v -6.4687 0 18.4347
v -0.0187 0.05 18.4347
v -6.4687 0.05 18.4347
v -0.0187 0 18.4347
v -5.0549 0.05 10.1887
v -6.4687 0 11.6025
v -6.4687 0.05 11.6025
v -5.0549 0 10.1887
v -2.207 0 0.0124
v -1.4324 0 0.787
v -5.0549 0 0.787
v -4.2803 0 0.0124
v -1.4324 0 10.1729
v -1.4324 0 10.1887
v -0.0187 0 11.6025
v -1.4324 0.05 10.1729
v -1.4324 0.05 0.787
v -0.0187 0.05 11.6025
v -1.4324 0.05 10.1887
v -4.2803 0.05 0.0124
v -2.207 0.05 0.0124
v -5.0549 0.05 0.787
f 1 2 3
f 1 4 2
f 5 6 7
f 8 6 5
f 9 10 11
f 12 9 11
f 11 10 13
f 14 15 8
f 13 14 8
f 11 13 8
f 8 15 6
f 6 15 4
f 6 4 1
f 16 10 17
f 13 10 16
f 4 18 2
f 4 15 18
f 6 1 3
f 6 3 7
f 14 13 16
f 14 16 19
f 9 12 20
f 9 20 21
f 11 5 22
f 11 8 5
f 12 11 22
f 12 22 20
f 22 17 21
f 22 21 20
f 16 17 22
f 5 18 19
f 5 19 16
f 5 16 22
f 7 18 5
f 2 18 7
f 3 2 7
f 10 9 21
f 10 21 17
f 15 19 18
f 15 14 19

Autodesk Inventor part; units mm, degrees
ref_plane "YZ Plane" through (0, 0, 0) normal (1, 0, 0) x (0, 1, 0)
ref_plane "XZ Plane" through (0, 0, 0) normal (0, 1, 0) x (-1, 0, 0)
ref_plane "XY Plane" through (0, 0, 0) normal (0, 0, 1) x (1, 0, 0)
sketch "Sketch1" plane through (0, 0, 0) normal (0, 1, 0) x (-1, 0, 0)
  line L0 (6.4687, 18.4347) -> (6.4687, 11.6025)
  line L1 (6.4687, 11.6025) -> (5.0549, 10.1887)
  line L2 (5.0549, 10.1887) -> (5.0549, 0.787)
  line L3 (5.0549, 0.787) -> (4.2803, 0.0124)
  line L4 (4.2803, 0.0124) -> (2.207, 0.0124)
  line L5 (2.207, 0.0124) -> (1.4324, 0.787)
  line L6 (1.4324, 0.787) -> (1.4324, 10.1729)
  line L7 (1.4324, 10.1729) -> (1.4324, 10.1887)
  line L8 (1.4324, 10.1887) -> (0.0187, 11.6025)
  line L9 (0.0187, 11.6025) -> (0.0187, 18.4347)
  line L10 (0.0187, 18.4347) -> (6.4687, 18.4347)
  point P0 (0, 0)
extrude "Extrusion1" add sketch "Sketch1" along normal blind 0.05
ref_plane "Work Plane1" through (-3.2437, 0, 18.4347) normal (1, 0, 0) x (0, 0, -1)
properties part number "32ch_ECoG"
